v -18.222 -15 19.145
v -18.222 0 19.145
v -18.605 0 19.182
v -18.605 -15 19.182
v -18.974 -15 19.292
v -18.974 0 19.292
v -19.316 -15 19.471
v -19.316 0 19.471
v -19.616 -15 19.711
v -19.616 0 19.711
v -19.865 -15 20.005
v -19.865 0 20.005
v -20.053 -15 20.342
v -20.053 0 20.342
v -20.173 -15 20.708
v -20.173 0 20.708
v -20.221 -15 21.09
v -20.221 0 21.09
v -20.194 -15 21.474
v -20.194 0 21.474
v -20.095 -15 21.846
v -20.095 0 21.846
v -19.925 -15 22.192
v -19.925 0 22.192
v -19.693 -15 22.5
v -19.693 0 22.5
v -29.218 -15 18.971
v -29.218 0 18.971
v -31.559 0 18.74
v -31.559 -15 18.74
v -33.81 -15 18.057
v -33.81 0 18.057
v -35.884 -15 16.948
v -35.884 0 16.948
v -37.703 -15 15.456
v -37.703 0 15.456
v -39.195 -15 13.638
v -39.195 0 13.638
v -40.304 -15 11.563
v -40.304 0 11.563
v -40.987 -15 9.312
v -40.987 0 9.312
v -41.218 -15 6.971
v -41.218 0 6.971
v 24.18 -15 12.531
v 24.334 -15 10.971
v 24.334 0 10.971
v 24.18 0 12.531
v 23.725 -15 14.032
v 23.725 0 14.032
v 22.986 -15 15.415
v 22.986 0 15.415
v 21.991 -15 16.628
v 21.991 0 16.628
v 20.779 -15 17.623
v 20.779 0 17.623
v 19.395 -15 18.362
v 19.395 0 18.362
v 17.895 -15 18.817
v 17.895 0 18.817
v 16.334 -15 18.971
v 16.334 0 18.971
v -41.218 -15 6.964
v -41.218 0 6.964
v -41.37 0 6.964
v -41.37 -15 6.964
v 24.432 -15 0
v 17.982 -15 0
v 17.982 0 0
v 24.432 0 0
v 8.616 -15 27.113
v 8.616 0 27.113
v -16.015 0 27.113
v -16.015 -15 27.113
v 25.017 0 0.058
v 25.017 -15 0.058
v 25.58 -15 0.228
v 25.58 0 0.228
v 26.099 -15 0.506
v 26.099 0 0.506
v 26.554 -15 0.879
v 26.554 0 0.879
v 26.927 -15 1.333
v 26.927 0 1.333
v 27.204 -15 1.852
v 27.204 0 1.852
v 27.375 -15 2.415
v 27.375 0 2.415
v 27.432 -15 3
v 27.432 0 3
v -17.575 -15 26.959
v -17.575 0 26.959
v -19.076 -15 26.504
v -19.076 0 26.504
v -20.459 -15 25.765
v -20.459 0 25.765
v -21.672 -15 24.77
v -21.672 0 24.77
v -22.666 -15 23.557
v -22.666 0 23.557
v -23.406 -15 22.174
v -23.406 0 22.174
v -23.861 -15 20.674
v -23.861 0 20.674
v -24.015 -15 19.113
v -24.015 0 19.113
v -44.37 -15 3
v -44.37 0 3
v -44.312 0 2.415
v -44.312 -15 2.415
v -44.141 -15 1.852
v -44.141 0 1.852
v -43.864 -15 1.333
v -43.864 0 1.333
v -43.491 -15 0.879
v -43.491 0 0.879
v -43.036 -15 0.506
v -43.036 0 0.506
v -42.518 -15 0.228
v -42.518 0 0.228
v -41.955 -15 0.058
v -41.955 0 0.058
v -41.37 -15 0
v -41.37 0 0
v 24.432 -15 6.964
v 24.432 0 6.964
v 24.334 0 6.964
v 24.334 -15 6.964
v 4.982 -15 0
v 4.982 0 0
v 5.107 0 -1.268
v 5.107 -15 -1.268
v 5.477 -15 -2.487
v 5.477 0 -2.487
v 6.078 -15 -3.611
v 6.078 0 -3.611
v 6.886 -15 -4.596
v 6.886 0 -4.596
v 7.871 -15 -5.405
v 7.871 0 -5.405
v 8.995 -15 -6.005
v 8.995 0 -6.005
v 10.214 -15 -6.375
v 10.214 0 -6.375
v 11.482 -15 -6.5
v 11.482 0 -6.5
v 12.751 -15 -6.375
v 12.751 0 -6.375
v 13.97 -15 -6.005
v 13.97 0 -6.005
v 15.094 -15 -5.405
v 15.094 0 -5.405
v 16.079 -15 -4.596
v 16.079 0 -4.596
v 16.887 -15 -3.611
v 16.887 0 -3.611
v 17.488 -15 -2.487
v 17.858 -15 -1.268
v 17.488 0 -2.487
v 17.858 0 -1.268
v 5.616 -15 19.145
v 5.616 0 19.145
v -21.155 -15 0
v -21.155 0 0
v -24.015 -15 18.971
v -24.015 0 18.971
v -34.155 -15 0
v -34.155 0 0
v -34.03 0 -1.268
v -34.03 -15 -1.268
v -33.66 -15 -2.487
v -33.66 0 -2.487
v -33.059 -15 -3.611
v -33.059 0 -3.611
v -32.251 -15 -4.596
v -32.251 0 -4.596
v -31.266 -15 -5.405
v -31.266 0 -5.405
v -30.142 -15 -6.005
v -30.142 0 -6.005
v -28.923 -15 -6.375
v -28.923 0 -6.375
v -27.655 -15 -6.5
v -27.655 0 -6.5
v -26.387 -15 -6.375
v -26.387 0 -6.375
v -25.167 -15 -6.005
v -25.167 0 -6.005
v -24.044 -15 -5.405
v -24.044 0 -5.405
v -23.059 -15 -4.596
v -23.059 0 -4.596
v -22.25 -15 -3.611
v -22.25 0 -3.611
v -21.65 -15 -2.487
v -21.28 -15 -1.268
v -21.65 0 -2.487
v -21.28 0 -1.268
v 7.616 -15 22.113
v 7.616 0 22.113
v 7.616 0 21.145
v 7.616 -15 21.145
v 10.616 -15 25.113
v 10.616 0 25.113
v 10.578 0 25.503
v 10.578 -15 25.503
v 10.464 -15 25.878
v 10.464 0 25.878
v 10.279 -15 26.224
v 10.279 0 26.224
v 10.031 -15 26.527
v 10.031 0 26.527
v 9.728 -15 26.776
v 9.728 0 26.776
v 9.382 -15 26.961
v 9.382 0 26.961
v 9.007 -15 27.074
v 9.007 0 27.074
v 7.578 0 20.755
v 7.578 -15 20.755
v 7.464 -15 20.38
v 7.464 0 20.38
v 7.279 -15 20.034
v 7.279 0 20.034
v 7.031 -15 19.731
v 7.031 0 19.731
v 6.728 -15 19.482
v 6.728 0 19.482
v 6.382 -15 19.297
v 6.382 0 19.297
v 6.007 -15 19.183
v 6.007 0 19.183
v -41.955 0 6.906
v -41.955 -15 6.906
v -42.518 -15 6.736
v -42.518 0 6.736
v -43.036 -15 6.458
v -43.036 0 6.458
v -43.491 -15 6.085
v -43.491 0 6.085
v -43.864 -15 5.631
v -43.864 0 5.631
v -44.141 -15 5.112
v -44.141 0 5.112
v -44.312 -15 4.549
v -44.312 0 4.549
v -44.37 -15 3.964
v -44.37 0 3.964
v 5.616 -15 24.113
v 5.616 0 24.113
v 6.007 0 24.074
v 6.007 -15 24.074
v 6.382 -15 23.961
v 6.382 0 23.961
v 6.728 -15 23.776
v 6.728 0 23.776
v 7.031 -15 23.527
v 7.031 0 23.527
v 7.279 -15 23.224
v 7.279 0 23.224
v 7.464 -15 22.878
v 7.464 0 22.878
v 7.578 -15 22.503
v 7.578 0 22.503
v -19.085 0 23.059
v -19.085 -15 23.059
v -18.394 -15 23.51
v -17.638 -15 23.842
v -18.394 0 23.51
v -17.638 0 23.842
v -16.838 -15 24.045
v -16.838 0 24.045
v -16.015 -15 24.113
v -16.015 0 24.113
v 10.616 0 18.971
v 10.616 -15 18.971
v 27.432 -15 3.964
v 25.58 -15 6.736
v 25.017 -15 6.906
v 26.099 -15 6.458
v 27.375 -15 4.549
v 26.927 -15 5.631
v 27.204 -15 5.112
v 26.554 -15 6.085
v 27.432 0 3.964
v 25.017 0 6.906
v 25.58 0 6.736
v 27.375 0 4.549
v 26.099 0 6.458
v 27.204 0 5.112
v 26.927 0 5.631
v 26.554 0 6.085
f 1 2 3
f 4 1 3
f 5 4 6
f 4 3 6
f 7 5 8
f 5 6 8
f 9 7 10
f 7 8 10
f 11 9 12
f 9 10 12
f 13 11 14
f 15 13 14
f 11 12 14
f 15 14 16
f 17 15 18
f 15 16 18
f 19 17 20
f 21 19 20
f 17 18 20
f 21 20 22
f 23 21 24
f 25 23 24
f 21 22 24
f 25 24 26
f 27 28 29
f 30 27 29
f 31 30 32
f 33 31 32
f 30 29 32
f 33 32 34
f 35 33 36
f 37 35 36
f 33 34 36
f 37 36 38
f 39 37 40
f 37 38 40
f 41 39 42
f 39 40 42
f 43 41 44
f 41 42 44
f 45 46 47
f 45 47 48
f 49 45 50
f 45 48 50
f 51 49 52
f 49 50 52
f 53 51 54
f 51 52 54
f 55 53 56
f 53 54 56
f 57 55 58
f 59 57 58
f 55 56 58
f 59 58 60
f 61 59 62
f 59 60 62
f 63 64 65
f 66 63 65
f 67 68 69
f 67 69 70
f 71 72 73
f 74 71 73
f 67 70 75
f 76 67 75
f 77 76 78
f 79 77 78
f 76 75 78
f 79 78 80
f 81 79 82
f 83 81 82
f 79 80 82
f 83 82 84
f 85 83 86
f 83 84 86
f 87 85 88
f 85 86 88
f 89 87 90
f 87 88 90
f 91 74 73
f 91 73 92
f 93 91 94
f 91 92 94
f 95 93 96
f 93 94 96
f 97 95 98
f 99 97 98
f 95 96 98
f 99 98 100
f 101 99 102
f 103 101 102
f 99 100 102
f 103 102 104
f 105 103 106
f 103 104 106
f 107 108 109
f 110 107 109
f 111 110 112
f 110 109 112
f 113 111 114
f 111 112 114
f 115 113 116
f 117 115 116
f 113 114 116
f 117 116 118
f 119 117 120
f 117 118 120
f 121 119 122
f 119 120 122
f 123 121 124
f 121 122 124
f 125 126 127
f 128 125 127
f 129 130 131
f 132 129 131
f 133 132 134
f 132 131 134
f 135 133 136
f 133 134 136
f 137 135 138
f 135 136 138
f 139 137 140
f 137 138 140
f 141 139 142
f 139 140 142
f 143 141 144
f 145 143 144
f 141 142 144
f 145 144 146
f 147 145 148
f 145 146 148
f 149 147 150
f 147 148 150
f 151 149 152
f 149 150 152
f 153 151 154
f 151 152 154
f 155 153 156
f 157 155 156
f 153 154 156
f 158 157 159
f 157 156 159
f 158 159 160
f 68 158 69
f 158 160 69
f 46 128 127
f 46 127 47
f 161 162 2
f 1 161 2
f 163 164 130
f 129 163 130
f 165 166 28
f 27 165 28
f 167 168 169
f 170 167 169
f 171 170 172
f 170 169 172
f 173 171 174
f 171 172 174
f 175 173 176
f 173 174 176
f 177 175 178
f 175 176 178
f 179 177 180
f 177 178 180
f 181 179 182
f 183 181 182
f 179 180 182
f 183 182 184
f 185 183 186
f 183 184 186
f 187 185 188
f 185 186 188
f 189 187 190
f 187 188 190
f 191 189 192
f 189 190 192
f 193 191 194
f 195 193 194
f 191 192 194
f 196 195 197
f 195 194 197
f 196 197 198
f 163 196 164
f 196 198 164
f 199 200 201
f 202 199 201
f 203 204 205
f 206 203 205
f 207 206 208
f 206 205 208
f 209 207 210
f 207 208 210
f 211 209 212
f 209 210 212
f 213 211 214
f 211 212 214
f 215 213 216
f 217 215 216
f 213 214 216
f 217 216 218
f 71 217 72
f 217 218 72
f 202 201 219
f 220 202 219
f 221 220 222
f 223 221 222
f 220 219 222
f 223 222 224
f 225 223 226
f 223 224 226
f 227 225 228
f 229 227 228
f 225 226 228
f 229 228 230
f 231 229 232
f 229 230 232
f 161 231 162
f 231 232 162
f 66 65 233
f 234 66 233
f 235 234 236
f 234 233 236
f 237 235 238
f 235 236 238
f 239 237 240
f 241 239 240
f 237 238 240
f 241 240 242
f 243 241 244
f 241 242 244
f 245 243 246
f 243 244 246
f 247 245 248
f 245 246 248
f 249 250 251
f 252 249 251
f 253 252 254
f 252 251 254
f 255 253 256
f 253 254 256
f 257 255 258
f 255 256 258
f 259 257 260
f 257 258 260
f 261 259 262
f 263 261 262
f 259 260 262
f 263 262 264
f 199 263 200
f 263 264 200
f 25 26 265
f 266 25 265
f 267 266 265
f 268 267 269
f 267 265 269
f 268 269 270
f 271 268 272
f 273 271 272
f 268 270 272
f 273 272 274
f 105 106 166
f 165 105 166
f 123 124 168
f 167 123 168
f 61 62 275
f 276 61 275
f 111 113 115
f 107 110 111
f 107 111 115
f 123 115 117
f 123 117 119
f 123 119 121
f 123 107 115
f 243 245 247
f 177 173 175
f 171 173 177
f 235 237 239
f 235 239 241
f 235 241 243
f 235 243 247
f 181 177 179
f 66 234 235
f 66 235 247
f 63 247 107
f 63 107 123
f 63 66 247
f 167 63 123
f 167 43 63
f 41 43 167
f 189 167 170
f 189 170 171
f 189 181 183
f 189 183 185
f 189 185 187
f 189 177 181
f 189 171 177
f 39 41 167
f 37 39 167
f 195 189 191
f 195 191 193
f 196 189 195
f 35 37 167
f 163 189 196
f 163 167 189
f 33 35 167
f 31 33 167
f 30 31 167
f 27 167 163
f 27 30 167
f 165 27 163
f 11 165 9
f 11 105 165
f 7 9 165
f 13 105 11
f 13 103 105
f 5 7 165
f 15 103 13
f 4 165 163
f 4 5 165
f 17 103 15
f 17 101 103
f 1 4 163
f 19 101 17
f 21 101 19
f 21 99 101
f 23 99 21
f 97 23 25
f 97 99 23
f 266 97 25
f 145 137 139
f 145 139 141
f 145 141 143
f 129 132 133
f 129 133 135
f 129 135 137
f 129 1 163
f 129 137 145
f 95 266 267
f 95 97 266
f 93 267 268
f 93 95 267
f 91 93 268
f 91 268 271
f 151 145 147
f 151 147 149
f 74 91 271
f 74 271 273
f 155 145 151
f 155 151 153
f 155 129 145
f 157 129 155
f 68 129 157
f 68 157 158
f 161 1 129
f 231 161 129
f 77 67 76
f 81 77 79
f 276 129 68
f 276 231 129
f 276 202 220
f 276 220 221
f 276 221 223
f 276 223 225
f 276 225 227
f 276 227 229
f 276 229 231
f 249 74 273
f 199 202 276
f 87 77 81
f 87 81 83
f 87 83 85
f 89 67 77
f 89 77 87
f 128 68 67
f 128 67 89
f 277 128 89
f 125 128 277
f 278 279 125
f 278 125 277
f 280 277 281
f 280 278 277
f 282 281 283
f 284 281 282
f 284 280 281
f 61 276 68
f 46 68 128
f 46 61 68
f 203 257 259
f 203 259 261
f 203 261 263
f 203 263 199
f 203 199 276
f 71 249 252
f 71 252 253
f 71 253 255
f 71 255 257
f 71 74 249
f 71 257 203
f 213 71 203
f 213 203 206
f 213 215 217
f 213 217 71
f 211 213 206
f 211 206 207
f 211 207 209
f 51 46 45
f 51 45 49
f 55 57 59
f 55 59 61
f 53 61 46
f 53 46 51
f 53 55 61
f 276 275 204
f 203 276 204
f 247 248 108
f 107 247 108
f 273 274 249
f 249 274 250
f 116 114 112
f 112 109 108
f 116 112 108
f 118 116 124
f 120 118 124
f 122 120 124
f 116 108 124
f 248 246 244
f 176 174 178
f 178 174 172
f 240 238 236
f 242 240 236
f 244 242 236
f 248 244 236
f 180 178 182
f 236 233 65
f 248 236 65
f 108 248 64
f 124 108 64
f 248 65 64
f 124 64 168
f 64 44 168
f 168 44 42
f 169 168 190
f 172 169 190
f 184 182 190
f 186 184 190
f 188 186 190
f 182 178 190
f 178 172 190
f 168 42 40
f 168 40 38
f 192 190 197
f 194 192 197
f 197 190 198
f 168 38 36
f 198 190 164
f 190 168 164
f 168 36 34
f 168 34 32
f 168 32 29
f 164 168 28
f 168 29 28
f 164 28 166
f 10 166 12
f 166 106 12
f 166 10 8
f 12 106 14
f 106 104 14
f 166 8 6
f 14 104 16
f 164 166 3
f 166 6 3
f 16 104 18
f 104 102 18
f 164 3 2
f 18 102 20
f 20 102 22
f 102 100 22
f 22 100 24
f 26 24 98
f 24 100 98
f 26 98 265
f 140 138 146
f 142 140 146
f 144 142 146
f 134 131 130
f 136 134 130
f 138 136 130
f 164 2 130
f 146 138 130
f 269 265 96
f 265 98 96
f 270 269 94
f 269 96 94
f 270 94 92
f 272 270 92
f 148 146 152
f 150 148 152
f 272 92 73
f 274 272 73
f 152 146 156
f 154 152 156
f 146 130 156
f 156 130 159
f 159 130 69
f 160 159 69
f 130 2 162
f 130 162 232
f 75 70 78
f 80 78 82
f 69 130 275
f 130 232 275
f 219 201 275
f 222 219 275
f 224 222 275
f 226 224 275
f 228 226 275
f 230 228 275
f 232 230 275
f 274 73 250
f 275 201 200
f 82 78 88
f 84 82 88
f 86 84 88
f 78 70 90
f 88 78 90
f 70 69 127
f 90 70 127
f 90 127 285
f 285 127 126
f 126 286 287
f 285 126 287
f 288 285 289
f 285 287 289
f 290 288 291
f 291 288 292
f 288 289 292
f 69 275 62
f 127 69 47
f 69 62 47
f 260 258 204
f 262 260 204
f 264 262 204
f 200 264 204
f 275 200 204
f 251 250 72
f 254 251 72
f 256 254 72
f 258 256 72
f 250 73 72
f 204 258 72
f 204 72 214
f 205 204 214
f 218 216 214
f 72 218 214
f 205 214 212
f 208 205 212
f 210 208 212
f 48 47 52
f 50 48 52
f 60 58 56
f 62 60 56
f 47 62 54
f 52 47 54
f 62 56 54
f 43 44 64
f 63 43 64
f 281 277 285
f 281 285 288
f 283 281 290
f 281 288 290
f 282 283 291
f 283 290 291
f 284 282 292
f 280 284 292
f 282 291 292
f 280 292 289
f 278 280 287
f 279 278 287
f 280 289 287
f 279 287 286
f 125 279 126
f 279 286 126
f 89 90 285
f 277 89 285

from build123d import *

# Parameters (mm, degrees)
F1_DEPTH = 15


with BuildPart() as f1:
    # F0 (on Front) → F1 (new body)
    with BuildSketch(Plane.XZ):
        with BuildLine():
            ThreePointArc((-44.369697, 3), (-43.491018, 0.87868), (-41.369697, 0))
            Line((-41.369697, 0), (-34.154815, 0))
            ThreePointArc((-34.154815, 0), (-27.654815, -6.5), (-21.154815, 0))
            Line((-21.154815, 0), (4.982472, 0))
            ThreePointArc((4.982472, 0), (11.482472, -6.5), (17.982472, 0))
            Line((17.982472, 0), (24.432209, 0))
            ThreePointArc((24.432209, 0), (26.553529, 0.87868), (27.432209, 3))
            Line((27.432209, 3), (27.432209, 3.964023))
            ThreePointArc((27.432209, 3.964023), (26.553529, 6.085343), (24.432209, 6.964023))
            Line((24.432209, 6.964023), (24.333949, 6.964023))
            Line((24.333949, 6.964023), (24.333949, 10.970772))
            ThreePointArc((24.333949, 10.970772), (21.990804, 16.627626), (16.333949, 18.970772))
            Line((16.333949, 18.970772), (10.616395, 18.970772))
            Line((10.616395, 18.970772), (10.616395, 25.112818))
            ThreePointArc((10.616395, 25.112818), (10.030609, 26.527032), (8.616395, 27.112818))
            Line((8.616395, 27.112818), (-16.014689, 27.112818))
            ThreePointArc((-16.014689, 27.112818), (-21.671543, 24.769673), (-24.014689, 19.112818))
            Line((-24.014689, 19.112818), (-24.014689, 18.970772))
            Line((-24.014689, 18.970772), (-29.21758, 18.970772))
            ThreePointArc((-29.21758, 18.970772), (-37.702862, 15.456053), (-41.21758, 6.970772))
            Line((-41.21758, 6.970772), (-41.21758, 6.964023))
            Line((-41.21758, 6.964023), (-41.369697, 6.964023))
            ThreePointArc((-41.369697, 6.964023), (-43.491018, 6.085343), (-44.369697, 3.964023))
            Line((-44.369697, 3.964023), (-44.369697, 3))
        make_face()
        with BuildLine():
            ThreePointArc((-19.692936, 22.499631), (-18.022914, 23.691795), (-16.014689, 24.112818))
            Line((-16.014689, 24.112818), (5.616395, 24.112818))
            ThreePointArc((5.616395, 24.112818), (7.030609, 23.527032), (7.616395, 22.112818))
            Line((7.616395, 22.112818), (7.616395, 21.144906))
            ThreePointArc((7.616395, 21.144906), (7.030609, 19.730692), (5.616395, 19.144906))
            Line((5.616395, 19.144906), (-18.221637, 19.144906))
            ThreePointArc((-18.221637, 19.144906), (-20.053228, 20.341616), (-19.692936, 22.499631))
        make_face(mode=Mode.SUBTRACT)
    extrude(amount=F1_DEPTH)


solid = f1.part
